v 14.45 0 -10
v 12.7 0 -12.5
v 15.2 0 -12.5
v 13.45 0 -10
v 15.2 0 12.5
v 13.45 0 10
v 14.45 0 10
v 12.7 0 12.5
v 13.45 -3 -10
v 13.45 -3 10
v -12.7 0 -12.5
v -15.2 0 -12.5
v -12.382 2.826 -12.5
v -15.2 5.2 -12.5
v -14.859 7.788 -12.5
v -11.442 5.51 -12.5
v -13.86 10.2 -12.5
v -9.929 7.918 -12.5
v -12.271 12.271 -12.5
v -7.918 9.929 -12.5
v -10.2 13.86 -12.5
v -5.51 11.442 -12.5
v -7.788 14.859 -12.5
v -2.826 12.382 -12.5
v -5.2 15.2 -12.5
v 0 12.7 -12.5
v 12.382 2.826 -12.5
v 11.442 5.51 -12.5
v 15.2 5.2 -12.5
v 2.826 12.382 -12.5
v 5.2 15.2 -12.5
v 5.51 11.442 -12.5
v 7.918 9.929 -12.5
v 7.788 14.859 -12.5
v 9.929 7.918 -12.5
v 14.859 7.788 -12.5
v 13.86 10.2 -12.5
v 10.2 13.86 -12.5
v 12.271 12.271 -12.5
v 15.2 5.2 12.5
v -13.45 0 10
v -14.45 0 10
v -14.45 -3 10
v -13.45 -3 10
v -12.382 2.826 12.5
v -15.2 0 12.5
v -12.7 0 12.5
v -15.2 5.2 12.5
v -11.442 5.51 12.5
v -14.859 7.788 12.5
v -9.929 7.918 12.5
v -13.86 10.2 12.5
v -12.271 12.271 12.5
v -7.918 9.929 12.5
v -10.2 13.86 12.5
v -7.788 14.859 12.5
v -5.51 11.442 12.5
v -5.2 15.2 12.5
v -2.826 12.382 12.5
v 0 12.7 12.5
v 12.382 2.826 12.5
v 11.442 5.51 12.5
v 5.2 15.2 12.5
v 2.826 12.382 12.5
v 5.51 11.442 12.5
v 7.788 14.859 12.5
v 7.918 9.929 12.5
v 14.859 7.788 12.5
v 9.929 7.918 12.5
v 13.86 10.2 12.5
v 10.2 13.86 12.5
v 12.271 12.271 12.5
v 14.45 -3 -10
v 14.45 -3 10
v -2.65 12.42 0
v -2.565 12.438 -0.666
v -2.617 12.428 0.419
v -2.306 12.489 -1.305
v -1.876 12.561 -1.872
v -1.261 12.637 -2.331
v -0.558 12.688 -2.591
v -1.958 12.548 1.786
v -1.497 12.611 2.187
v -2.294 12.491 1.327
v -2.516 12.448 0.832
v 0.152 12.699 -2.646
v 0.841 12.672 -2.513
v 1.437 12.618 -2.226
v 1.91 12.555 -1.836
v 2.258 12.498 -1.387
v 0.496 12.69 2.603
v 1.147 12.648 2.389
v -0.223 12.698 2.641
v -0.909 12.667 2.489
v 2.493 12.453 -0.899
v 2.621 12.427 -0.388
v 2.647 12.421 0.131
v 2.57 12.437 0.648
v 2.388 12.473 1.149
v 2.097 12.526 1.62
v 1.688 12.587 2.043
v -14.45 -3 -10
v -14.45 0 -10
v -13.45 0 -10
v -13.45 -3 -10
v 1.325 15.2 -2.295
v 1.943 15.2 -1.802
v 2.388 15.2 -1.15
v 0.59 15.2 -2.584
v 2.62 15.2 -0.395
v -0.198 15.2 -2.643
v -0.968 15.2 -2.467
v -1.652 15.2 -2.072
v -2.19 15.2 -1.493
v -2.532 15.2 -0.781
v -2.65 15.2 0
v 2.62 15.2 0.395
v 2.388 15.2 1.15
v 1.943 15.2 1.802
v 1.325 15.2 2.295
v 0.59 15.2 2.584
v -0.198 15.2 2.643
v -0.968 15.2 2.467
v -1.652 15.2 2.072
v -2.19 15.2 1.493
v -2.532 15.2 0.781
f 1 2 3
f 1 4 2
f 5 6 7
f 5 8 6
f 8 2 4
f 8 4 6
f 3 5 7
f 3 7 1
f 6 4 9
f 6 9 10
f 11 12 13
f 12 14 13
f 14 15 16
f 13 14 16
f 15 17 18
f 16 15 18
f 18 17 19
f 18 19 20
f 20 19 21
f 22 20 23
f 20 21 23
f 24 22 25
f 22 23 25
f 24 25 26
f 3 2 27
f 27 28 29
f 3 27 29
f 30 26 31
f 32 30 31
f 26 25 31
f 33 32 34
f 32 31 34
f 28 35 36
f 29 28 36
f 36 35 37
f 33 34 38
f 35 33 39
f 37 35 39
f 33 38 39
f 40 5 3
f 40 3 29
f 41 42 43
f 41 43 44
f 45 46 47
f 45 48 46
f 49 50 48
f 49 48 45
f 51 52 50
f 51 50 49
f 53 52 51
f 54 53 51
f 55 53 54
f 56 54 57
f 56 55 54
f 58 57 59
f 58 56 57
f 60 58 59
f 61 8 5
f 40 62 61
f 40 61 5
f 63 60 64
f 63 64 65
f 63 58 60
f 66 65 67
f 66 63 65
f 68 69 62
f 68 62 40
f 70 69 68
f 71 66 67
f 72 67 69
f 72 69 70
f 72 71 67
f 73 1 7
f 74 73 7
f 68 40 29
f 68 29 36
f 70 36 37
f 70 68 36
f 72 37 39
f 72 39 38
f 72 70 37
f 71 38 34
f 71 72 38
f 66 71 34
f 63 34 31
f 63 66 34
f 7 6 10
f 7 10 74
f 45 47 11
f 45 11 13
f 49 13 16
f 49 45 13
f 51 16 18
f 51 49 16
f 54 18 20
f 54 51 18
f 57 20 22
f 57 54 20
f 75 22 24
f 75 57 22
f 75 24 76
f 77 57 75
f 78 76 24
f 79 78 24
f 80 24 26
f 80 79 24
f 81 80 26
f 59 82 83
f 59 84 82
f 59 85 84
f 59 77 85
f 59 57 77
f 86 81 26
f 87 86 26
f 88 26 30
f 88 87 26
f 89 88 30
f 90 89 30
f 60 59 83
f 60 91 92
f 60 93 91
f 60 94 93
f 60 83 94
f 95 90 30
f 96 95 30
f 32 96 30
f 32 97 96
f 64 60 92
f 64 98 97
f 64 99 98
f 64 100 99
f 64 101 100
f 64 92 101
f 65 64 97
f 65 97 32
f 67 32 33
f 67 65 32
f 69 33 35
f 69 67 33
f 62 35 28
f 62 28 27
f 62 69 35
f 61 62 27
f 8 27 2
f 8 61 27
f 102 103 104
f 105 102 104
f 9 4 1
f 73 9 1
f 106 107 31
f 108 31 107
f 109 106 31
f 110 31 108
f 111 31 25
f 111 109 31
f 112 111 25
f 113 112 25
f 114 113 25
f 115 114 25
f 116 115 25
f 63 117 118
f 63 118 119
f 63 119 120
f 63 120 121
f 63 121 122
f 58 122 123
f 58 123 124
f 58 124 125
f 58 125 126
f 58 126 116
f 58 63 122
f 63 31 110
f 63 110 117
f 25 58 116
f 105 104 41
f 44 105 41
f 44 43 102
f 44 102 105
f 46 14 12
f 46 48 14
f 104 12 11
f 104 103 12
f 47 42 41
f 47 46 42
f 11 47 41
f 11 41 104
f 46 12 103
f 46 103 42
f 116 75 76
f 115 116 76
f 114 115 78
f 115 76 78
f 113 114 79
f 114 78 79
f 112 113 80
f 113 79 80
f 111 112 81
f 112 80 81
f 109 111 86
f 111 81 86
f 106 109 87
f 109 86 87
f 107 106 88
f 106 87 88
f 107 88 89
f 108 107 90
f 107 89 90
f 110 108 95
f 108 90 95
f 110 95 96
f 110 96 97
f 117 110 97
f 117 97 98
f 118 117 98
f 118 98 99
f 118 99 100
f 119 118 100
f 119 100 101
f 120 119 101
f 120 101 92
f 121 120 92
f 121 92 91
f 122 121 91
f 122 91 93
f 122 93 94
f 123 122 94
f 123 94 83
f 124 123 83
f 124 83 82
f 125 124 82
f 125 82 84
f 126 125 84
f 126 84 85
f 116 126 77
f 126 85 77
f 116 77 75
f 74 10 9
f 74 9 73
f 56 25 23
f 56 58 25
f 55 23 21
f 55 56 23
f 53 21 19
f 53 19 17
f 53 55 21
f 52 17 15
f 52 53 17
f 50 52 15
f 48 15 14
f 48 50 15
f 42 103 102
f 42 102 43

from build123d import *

# Parameters (mm, degrees)
BOSS_EXTRUDE1_DEPTH  = 12.5
M5_CLEARANCE_HOLE1_D = 5.3
SKETCH4_W            = 1
SKETCH4_H            = 20
BOSS_EXTRUDE2_DEPTH  = 3


with BuildPart() as part:
    # Sketch1 → Boss-Extrude1 (new body, symmetric)
    with BuildSketch(Plane.XY):
        with BuildLine():
            Line((-15.2, 0), (-12.7, 0))
            ThreePointArc((-12.7, 0), (0, 12.7), (12.7, 0))
            Line((12.7, 0), (15.2, 0))
            Line((15.2, 0), (15.2, 5.2))
            ThreePointArc((15.2, 5.2), (12.271067812, 12.271067812), (5.2, 15.2))
            Line((5.2, 15.2), (-5.2, 15.2))
            ThreePointArc((-5.2, 15.2), (-12.271067812, 12.271067812), (-15.2, 5.2))
            Line((-15.2, 5.2), (-15.2, 0))
        make_face()
    extrude(amount=BOSS_EXTRUDE1_DEPTH, both=True)

    # M5 Clearance Hole1 (through all)
    with Locations(Plane(origin=(0, 15.2, 0), x_dir=(1, 0, 0), z_dir=(0, 1, 0))):
        with Locations((0, 0)):
            Hole(M5_CLEARANCE_HOLE1_D / 2)

    # Sketch4 → Boss-Extrude2 (add)
    with BuildSketch(Plane.XZ):
        with Locations((-13.95, 0)):
            Rectangle(SKETCH4_W, SKETCH4_H)
        with Locations((13.95, 0)):
            Rectangle(SKETCH4_W, SKETCH4_H)
    extrude(amount=BOSS_EXTRUDE2_DEPTH)


solid = part.part
